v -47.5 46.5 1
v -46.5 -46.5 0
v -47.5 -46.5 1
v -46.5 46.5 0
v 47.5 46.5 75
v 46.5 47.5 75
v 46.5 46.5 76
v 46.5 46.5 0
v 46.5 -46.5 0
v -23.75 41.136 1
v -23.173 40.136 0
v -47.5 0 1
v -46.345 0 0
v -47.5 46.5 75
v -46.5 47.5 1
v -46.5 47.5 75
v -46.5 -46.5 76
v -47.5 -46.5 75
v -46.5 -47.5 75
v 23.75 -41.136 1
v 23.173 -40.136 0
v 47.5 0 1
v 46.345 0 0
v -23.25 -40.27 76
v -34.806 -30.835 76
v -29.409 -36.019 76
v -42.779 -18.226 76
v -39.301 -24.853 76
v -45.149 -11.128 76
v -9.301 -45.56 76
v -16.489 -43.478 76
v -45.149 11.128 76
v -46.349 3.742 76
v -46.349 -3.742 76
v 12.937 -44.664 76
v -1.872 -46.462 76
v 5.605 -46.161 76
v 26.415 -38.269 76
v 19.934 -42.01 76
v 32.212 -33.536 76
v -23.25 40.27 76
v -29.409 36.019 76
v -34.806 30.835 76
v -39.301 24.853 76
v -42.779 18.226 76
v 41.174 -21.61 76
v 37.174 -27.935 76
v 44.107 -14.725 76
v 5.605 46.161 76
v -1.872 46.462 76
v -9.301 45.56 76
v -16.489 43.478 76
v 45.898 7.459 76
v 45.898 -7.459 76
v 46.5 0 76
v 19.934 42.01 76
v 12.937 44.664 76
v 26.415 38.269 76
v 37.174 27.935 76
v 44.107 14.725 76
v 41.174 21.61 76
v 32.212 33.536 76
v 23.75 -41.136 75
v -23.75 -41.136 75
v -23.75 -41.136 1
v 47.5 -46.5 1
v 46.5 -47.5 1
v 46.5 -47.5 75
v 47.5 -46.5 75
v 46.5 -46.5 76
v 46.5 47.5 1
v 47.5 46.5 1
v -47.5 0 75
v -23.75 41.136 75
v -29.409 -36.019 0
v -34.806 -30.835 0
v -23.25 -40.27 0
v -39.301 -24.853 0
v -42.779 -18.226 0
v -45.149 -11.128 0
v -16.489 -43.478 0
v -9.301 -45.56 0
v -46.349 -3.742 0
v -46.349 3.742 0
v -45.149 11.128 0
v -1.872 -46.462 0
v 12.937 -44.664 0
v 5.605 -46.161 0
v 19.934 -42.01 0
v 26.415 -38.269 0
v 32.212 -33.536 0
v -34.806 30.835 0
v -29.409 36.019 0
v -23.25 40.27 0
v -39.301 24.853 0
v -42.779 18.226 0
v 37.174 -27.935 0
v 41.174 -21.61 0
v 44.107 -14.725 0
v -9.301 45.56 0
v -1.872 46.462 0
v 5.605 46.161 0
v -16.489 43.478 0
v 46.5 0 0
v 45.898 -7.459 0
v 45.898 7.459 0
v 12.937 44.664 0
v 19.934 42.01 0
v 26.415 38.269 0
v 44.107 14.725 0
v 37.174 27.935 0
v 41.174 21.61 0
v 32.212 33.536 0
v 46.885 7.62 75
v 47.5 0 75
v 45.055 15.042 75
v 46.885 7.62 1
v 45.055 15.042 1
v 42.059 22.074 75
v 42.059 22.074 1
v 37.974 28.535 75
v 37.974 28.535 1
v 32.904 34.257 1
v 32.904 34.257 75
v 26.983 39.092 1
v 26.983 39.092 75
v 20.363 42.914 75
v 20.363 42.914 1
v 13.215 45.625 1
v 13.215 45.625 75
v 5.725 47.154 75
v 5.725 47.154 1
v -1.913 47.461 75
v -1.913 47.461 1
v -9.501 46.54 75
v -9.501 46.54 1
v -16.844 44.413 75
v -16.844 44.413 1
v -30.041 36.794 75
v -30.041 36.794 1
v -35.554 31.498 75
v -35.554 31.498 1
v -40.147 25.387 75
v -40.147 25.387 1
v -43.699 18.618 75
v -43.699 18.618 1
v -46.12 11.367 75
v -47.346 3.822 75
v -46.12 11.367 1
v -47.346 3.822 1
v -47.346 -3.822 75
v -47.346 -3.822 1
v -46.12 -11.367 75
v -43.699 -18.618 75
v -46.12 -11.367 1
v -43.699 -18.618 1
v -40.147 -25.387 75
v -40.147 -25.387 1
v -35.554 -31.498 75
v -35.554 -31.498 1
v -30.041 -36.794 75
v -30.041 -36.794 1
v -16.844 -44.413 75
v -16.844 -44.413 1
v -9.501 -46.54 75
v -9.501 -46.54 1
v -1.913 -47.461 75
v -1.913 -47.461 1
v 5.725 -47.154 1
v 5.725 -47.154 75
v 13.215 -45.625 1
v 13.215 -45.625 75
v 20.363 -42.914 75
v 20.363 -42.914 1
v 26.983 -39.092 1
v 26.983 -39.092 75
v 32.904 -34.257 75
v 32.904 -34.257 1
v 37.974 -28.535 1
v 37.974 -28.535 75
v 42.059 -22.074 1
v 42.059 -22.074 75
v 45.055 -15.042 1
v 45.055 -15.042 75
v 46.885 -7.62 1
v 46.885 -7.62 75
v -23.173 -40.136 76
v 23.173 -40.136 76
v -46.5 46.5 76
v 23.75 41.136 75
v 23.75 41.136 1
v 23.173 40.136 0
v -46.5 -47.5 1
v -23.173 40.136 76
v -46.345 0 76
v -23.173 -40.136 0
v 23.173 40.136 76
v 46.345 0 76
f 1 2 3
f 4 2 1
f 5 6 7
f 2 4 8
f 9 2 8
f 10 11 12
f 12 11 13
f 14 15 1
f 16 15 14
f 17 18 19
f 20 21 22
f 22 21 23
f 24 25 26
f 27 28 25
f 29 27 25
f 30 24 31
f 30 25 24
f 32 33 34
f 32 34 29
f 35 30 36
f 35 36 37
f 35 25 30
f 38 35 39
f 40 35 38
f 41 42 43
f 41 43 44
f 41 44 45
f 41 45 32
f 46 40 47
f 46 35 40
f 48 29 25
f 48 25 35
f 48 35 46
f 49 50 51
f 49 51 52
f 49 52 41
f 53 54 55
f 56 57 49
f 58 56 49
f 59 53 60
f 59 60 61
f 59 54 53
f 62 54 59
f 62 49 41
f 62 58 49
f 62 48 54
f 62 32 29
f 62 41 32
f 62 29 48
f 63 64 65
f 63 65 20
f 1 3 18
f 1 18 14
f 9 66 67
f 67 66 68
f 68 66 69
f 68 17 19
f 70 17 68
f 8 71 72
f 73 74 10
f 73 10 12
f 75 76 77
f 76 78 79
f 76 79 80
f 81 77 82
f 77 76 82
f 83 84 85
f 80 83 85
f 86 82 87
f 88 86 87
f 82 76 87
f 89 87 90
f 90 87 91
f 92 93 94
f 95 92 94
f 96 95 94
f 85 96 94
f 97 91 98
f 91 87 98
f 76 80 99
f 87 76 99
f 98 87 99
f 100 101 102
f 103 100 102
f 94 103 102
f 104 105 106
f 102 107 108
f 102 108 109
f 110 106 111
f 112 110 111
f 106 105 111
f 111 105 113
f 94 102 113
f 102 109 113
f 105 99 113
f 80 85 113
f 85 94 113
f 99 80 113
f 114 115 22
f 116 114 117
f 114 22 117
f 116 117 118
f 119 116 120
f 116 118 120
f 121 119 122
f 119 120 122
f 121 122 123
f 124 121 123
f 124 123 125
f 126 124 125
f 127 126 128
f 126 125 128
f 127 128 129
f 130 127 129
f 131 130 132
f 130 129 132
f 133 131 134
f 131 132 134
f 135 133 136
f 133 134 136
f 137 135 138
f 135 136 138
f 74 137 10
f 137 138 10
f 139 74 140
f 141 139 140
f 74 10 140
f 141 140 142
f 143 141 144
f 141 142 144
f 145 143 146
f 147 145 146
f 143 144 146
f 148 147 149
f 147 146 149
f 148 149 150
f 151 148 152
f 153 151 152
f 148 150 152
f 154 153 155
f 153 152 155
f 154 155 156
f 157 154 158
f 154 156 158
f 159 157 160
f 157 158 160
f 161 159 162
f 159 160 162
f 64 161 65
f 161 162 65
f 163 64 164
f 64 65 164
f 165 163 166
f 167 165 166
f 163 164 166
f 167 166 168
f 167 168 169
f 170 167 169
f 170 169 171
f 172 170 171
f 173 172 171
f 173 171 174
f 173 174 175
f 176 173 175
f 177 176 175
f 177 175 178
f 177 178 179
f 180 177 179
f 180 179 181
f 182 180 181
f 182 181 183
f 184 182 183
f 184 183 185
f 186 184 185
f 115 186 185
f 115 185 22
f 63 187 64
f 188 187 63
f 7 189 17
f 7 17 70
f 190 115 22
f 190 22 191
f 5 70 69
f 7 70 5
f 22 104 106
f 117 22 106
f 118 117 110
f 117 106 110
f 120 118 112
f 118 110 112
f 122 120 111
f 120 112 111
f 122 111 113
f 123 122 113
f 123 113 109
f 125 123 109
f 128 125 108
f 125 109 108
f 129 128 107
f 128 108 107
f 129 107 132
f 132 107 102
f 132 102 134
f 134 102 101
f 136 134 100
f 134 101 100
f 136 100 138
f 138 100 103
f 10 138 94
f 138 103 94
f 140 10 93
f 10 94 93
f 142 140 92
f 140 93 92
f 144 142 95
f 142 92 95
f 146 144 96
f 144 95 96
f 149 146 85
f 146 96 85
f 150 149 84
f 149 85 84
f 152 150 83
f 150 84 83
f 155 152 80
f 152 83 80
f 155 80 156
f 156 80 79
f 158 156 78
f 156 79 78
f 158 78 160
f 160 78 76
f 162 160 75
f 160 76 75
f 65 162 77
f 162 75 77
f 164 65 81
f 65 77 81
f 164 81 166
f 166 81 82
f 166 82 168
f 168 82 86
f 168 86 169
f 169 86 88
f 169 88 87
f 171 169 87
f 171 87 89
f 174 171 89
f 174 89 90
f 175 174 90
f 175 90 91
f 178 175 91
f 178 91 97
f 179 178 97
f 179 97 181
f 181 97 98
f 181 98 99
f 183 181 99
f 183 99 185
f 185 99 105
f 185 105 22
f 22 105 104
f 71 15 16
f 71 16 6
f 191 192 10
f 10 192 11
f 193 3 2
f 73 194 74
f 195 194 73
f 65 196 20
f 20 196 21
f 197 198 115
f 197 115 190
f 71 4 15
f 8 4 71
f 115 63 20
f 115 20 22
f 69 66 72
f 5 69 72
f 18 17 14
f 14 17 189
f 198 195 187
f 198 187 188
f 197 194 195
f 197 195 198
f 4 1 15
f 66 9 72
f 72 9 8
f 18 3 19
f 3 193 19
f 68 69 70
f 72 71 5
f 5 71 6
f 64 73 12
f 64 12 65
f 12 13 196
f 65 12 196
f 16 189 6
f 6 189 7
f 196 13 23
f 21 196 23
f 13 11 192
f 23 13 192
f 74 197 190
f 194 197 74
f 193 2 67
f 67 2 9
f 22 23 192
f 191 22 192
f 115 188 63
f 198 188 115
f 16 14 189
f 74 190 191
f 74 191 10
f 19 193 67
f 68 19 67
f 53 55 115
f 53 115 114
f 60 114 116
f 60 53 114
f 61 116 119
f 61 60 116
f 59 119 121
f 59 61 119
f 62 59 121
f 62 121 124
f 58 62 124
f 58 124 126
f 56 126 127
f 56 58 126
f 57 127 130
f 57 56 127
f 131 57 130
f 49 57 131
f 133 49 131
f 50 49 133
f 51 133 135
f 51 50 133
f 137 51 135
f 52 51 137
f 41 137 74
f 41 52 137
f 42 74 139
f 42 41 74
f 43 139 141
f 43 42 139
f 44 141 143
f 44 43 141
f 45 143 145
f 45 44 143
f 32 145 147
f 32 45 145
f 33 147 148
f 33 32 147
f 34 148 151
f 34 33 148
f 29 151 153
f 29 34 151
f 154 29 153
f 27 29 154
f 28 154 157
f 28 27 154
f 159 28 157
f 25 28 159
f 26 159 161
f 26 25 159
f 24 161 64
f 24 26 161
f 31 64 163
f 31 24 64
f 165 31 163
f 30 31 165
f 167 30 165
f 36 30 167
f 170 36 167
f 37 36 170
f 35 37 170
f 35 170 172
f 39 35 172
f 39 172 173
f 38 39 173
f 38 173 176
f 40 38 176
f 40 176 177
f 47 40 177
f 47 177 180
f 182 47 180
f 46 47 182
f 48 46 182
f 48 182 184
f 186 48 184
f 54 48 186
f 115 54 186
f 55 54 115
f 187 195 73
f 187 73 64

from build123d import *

# Parameters (mm, degrees)
SKETCH_W        = 95
SKETCH_H        = 95
PAD_DEPTH       = 76
CHAMFER_SIZE    = 1
PAD001_DEPTH    = 76
CHAMFER001_SIZE = 1
SKETCH002_R     = 47.5
PAD002_DEPTH    = 76
CHAMFER002_SIZE = 1


with BuildPart() as balisecarre:
    # Sketch → Pad (new body)
    with BuildSketch(Plane.XY):
        Rectangle(SKETCH_W, SKETCH_H)
    extrude(amount=PAD_DEPTH)

    # Chamfer
    chamfer_edges = [balisecarre.edges().sort_by_distance(p)[0] for p in [
        (47.5, -47.5, 38),
        (-47.5, 47.5, 38),
        (-47.5, -47.5, 38),
        (47.5, 47.5, 38),
        (-47.5, 0, 76),
        (0, 47.5, 76),
        (47.5, 0, 76),
        (0, -47.5, 76),
        (-47.5, 0, 0),
        (0, 47.5, 0),
        (47.5, 0, 0),
        (0, -47.5, 0),
    ]]
    chamfer(chamfer_edges, length=CHAMFER_SIZE)


with BuildPart() as balisehexagone:
    # Sketch001 → Pad001 (new body)
    with BuildSketch(Plane.XY):
        Polygon((47.5, 0), (23.75, 41.136207), (-23.75, 41.136207), (-47.5, 0), (-23.75, -41.136207), (23.75, -41.136207), align=None)
    extrude(amount=PAD001_DEPTH)

    # Chamfer001
    chamfer001_edges = [balisehexagone.edges().sort_by_distance(p)[0] for p in [
        (35.625, 20.568103, 76),
        (0, 41.136207, 76),
        (-35.625, 20.568103, 76),
        (-35.625, -20.568103, 76),
        (0, -41.136207, 76),
        (35.625, -20.568103, 76),
        (35.625, 20.568103, 0),
        (0, 41.136207, 0),
        (-35.625, 20.568103, 0),
        (-35.625, -20.568103, 0),
        (0, -41.136207, 0),
        (35.625, -20.568103, 0),
    ]]
    chamfer(chamfer001_edges, length=CHAMFER001_SIZE)


with BuildPart() as balisecylindre:
    # Sketch002 → Pad002 (new body)
    with BuildSketch(Plane.XY):
        Circle(SKETCH002_R)
    extrude(amount=PAD002_DEPTH)

    # Chamfer002
    chamfer002_edges = [balisecylindre.edges().sort_by_distance(p)[0] for p in [
        (-47.5, 0, 76),
        (-47.5, 0, 0),
    ]]
    chamfer(chamfer002_edges, length=CHAMFER002_SIZE)


solid = Compound([balisecarre.part, balisehexagone.part, balisecylindre.part])
